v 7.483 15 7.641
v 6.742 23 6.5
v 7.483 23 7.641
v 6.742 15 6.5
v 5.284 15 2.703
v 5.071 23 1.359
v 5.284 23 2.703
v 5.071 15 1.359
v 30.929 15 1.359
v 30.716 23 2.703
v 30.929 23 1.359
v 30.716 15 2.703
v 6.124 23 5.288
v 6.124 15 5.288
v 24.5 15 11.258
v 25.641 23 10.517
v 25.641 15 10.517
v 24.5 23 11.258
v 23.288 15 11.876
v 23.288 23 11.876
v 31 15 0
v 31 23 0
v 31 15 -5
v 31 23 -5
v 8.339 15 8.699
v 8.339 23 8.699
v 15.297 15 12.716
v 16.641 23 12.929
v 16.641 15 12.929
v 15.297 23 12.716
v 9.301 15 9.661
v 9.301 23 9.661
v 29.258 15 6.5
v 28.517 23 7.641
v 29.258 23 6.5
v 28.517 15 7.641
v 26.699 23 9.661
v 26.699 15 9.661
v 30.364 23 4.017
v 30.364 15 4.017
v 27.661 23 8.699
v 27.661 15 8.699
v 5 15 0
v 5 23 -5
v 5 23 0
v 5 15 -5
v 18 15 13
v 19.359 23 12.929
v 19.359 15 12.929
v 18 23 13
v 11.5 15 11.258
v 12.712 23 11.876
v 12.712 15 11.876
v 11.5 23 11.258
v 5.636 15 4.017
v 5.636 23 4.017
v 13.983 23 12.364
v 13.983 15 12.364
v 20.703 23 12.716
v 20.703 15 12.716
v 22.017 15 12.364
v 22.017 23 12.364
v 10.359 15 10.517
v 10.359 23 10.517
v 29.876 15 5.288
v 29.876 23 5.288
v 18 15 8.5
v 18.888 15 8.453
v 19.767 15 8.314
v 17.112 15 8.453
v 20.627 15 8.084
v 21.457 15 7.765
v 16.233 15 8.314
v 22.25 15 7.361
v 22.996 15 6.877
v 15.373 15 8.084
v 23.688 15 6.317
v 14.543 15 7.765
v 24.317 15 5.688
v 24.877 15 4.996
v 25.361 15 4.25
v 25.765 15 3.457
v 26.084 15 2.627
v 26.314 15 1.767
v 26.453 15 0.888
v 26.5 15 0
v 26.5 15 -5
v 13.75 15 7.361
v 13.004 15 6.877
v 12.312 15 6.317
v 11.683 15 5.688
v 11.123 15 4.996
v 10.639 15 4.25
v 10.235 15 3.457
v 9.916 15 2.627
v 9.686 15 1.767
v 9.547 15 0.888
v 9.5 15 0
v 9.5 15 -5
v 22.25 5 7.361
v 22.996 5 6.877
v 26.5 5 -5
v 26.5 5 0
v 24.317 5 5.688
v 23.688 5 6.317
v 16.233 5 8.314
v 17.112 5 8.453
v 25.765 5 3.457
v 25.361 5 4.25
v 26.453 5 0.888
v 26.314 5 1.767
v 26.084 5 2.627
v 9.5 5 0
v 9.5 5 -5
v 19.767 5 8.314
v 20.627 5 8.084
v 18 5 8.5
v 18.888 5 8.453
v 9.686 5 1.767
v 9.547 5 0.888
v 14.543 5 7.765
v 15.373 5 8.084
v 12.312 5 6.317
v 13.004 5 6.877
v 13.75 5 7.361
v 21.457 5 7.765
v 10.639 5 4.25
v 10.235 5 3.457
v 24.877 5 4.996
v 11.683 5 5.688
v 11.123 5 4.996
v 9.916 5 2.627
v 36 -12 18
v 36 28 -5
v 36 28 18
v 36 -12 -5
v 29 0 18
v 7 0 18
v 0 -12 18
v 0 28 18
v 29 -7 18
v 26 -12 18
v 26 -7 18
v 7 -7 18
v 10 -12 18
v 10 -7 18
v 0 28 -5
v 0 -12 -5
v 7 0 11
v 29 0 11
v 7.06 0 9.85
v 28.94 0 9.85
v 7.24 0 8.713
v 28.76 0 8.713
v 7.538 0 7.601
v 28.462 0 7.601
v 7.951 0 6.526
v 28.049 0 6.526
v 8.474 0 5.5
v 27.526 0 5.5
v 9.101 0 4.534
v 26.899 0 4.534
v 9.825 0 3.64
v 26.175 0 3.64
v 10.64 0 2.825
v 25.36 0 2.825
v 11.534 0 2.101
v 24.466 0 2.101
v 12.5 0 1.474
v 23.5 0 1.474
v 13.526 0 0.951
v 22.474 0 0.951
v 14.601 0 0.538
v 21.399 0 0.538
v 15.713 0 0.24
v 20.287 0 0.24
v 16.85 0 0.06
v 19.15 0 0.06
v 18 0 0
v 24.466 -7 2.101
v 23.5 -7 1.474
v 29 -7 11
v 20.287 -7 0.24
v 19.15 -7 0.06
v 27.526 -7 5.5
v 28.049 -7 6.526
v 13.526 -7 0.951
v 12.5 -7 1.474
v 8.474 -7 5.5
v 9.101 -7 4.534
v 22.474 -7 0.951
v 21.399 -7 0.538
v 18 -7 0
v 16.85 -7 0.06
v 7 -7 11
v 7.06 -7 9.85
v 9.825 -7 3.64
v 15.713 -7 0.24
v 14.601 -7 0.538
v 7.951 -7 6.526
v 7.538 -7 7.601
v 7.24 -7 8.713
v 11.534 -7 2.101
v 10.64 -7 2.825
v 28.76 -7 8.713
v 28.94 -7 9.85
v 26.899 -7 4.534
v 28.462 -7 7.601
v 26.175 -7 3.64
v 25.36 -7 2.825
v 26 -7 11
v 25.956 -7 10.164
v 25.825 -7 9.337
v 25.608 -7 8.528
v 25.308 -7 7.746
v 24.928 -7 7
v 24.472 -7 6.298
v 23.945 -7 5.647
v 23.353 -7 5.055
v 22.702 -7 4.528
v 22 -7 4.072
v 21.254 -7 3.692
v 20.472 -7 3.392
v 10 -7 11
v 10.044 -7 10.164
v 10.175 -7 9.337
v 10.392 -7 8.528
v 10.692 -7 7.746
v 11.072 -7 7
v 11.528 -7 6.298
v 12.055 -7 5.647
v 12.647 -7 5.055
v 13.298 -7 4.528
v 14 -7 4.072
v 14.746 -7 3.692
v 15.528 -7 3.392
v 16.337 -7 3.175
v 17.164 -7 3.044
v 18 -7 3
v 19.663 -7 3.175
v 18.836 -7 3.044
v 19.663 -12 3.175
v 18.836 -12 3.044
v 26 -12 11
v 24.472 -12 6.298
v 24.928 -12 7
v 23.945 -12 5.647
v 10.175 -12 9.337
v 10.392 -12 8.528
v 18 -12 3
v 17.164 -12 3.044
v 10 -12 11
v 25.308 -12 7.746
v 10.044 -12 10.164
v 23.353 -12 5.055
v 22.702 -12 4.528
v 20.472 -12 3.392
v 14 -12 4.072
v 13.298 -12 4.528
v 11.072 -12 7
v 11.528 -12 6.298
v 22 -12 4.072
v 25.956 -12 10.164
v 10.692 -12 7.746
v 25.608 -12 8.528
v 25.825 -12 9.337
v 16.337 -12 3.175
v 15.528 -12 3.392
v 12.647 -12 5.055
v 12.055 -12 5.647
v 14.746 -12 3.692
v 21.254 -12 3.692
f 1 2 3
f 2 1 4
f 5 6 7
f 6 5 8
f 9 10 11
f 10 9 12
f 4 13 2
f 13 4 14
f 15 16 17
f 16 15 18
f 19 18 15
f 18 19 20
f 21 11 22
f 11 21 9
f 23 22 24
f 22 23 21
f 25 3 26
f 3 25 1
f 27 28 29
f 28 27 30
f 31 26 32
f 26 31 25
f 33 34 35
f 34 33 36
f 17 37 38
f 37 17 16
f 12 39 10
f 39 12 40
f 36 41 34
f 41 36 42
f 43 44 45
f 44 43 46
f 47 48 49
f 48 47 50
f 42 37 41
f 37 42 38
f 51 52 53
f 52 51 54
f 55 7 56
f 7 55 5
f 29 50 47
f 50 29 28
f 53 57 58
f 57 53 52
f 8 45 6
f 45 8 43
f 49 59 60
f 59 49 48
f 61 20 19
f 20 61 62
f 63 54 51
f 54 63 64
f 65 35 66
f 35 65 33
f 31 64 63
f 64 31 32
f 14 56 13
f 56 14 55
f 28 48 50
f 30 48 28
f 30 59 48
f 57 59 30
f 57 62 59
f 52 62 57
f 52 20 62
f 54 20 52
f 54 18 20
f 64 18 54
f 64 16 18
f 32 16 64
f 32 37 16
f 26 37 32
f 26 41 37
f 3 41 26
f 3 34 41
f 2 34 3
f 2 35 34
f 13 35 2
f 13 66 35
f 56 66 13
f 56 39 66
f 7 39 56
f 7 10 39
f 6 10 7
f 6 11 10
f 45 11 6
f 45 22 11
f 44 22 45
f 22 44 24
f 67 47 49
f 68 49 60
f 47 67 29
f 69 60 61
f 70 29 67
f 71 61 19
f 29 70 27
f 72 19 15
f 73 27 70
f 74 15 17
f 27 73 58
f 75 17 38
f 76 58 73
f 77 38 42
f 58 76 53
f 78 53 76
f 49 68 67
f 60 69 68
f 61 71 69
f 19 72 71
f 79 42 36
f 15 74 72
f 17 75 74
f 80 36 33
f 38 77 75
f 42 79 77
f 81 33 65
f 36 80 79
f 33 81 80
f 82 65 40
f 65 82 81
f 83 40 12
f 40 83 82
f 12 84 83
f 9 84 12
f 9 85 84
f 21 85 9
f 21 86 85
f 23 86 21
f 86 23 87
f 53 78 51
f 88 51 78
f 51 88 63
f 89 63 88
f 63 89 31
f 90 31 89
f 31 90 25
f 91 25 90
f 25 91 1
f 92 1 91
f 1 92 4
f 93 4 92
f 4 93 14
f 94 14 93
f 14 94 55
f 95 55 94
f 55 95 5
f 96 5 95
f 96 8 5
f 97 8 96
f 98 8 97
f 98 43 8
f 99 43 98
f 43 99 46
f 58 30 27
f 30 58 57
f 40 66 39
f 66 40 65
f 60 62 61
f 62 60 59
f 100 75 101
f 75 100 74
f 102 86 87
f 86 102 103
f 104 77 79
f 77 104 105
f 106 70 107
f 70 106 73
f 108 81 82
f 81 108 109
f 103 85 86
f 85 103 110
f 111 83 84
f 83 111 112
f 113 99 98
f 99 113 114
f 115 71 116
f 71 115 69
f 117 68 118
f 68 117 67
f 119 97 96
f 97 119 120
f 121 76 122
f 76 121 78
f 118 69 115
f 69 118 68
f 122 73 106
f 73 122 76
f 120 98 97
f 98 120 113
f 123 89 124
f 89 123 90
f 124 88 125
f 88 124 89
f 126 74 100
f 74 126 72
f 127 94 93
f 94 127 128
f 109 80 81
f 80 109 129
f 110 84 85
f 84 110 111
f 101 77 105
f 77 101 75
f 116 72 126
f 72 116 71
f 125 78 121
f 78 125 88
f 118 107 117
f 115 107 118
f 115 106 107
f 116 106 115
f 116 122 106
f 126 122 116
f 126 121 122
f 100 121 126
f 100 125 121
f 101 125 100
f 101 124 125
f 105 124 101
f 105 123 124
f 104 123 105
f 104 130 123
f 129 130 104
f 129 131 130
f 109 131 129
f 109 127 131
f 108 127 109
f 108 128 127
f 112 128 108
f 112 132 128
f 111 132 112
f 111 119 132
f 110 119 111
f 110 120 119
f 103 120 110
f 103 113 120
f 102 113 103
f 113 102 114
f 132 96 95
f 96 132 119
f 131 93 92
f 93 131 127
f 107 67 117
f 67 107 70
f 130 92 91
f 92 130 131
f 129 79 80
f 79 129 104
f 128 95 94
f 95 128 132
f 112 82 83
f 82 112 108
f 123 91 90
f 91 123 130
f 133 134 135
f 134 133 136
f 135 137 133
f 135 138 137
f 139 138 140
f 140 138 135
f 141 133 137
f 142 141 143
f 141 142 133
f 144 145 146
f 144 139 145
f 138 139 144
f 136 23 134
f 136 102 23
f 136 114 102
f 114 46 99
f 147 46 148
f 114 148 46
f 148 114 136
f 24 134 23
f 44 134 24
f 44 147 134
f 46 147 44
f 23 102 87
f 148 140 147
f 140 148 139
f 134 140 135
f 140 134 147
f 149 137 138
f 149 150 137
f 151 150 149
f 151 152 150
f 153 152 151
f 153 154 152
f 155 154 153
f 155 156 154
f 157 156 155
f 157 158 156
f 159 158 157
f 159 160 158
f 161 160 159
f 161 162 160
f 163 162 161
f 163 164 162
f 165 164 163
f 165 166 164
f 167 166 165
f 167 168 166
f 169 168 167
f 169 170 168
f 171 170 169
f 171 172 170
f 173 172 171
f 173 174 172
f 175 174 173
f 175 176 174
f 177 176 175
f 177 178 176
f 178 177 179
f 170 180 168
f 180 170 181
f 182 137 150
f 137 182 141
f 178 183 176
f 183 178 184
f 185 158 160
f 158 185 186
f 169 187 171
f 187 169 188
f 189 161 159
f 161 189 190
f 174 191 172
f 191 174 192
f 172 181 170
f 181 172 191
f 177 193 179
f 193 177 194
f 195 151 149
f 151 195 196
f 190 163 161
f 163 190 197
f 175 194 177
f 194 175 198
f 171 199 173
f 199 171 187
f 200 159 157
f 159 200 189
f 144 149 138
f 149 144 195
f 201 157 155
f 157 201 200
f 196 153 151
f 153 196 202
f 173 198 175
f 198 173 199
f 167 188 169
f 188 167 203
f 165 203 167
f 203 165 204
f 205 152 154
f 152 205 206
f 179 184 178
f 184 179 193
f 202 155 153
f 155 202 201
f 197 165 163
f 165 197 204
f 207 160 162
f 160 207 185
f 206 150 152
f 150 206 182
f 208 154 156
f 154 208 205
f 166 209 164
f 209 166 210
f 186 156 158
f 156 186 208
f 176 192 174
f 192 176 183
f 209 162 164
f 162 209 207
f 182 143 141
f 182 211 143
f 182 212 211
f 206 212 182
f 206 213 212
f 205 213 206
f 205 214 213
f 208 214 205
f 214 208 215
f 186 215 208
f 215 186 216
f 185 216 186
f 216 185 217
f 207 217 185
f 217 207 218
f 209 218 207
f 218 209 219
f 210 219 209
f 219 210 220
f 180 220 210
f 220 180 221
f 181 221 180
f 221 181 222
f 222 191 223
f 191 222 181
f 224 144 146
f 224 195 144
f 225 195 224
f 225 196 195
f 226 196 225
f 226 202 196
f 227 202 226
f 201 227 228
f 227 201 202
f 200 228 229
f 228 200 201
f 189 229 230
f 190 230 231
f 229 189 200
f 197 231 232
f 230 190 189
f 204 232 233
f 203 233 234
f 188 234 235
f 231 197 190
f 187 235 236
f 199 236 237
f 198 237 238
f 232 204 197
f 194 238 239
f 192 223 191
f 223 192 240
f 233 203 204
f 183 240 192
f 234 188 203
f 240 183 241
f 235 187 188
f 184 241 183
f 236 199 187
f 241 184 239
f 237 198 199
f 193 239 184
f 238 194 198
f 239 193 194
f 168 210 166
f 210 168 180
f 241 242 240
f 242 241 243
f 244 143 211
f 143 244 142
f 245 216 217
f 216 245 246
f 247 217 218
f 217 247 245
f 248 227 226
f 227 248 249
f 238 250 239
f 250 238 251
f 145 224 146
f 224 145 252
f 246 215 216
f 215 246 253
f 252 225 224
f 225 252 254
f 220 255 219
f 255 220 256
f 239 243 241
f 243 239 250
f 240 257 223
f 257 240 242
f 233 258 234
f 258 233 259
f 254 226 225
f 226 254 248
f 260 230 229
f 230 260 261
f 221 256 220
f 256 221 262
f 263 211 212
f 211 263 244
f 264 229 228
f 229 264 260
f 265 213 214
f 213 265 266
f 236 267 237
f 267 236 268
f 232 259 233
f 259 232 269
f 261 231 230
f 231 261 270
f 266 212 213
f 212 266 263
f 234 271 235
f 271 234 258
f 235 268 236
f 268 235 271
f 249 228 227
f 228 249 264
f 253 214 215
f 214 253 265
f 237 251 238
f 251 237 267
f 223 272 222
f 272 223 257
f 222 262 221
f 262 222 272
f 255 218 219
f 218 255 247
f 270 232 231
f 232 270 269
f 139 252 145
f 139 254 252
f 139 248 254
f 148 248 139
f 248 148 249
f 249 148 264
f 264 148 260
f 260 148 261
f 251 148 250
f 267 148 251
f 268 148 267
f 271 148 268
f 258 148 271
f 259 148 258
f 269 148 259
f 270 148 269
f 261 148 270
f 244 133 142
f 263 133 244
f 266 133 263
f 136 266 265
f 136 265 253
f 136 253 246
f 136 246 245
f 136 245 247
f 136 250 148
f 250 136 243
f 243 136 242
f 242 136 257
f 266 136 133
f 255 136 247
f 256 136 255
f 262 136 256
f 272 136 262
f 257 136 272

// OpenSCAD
dOuter = 26;
dInner = 17;
bOuter = 8;
bInner = 10;
$fn = 60;

DBearing = 22;
dBearing = 8;
hBearing = 7;

wall = 5; // minimal wall thickness


prusaCover();
bearingHolder();

module bearingHolder() {
    l = dOuter + wall * 2;
    b = hBearing + wall;
    h = dOuter / 2 + wall * 2;
    difference() {  
        translate([0, -b, -wall])
        cube([l, b, h]);
        translate([dOuter / 2 + wall, 0,DBearing / 2 ])
        cutOut(DBearing, hBearing, dBearing * 2, 20, DBearing, down=false);
    }
}


module prusaCover() {
    difference() {
        l = dOuter + wall * 2;
        b = bOuter + bInner + wall * 2;
        h = dOuter / 2 + wall * 2;
        
        translate([0, 0, -wall])
        cube ([l, b, h]);
        translate([l / 2, b - wall, 0])
        cutOut(dOuter, bOuter, dInner, bInner, dOuter);
    }
}
module cutOut(d1, h1, d2, h2, stretch, down=true) {
    rotate([90,down?90:-90,0]) {
        stretchCylinder(d=d1, b=h1, h=stretch);
        translate([0, 0, h1])
        stretchCylinder(d=d2, h=h2, h=stretch);
    }
}

module stretchCylinder(d = 10, b = 10, h = 10) {
   hull() {
       cylinder(d=d, h=b);
       translate([h,0,0])
       cylinder(d=d, h=b);
   }
}
